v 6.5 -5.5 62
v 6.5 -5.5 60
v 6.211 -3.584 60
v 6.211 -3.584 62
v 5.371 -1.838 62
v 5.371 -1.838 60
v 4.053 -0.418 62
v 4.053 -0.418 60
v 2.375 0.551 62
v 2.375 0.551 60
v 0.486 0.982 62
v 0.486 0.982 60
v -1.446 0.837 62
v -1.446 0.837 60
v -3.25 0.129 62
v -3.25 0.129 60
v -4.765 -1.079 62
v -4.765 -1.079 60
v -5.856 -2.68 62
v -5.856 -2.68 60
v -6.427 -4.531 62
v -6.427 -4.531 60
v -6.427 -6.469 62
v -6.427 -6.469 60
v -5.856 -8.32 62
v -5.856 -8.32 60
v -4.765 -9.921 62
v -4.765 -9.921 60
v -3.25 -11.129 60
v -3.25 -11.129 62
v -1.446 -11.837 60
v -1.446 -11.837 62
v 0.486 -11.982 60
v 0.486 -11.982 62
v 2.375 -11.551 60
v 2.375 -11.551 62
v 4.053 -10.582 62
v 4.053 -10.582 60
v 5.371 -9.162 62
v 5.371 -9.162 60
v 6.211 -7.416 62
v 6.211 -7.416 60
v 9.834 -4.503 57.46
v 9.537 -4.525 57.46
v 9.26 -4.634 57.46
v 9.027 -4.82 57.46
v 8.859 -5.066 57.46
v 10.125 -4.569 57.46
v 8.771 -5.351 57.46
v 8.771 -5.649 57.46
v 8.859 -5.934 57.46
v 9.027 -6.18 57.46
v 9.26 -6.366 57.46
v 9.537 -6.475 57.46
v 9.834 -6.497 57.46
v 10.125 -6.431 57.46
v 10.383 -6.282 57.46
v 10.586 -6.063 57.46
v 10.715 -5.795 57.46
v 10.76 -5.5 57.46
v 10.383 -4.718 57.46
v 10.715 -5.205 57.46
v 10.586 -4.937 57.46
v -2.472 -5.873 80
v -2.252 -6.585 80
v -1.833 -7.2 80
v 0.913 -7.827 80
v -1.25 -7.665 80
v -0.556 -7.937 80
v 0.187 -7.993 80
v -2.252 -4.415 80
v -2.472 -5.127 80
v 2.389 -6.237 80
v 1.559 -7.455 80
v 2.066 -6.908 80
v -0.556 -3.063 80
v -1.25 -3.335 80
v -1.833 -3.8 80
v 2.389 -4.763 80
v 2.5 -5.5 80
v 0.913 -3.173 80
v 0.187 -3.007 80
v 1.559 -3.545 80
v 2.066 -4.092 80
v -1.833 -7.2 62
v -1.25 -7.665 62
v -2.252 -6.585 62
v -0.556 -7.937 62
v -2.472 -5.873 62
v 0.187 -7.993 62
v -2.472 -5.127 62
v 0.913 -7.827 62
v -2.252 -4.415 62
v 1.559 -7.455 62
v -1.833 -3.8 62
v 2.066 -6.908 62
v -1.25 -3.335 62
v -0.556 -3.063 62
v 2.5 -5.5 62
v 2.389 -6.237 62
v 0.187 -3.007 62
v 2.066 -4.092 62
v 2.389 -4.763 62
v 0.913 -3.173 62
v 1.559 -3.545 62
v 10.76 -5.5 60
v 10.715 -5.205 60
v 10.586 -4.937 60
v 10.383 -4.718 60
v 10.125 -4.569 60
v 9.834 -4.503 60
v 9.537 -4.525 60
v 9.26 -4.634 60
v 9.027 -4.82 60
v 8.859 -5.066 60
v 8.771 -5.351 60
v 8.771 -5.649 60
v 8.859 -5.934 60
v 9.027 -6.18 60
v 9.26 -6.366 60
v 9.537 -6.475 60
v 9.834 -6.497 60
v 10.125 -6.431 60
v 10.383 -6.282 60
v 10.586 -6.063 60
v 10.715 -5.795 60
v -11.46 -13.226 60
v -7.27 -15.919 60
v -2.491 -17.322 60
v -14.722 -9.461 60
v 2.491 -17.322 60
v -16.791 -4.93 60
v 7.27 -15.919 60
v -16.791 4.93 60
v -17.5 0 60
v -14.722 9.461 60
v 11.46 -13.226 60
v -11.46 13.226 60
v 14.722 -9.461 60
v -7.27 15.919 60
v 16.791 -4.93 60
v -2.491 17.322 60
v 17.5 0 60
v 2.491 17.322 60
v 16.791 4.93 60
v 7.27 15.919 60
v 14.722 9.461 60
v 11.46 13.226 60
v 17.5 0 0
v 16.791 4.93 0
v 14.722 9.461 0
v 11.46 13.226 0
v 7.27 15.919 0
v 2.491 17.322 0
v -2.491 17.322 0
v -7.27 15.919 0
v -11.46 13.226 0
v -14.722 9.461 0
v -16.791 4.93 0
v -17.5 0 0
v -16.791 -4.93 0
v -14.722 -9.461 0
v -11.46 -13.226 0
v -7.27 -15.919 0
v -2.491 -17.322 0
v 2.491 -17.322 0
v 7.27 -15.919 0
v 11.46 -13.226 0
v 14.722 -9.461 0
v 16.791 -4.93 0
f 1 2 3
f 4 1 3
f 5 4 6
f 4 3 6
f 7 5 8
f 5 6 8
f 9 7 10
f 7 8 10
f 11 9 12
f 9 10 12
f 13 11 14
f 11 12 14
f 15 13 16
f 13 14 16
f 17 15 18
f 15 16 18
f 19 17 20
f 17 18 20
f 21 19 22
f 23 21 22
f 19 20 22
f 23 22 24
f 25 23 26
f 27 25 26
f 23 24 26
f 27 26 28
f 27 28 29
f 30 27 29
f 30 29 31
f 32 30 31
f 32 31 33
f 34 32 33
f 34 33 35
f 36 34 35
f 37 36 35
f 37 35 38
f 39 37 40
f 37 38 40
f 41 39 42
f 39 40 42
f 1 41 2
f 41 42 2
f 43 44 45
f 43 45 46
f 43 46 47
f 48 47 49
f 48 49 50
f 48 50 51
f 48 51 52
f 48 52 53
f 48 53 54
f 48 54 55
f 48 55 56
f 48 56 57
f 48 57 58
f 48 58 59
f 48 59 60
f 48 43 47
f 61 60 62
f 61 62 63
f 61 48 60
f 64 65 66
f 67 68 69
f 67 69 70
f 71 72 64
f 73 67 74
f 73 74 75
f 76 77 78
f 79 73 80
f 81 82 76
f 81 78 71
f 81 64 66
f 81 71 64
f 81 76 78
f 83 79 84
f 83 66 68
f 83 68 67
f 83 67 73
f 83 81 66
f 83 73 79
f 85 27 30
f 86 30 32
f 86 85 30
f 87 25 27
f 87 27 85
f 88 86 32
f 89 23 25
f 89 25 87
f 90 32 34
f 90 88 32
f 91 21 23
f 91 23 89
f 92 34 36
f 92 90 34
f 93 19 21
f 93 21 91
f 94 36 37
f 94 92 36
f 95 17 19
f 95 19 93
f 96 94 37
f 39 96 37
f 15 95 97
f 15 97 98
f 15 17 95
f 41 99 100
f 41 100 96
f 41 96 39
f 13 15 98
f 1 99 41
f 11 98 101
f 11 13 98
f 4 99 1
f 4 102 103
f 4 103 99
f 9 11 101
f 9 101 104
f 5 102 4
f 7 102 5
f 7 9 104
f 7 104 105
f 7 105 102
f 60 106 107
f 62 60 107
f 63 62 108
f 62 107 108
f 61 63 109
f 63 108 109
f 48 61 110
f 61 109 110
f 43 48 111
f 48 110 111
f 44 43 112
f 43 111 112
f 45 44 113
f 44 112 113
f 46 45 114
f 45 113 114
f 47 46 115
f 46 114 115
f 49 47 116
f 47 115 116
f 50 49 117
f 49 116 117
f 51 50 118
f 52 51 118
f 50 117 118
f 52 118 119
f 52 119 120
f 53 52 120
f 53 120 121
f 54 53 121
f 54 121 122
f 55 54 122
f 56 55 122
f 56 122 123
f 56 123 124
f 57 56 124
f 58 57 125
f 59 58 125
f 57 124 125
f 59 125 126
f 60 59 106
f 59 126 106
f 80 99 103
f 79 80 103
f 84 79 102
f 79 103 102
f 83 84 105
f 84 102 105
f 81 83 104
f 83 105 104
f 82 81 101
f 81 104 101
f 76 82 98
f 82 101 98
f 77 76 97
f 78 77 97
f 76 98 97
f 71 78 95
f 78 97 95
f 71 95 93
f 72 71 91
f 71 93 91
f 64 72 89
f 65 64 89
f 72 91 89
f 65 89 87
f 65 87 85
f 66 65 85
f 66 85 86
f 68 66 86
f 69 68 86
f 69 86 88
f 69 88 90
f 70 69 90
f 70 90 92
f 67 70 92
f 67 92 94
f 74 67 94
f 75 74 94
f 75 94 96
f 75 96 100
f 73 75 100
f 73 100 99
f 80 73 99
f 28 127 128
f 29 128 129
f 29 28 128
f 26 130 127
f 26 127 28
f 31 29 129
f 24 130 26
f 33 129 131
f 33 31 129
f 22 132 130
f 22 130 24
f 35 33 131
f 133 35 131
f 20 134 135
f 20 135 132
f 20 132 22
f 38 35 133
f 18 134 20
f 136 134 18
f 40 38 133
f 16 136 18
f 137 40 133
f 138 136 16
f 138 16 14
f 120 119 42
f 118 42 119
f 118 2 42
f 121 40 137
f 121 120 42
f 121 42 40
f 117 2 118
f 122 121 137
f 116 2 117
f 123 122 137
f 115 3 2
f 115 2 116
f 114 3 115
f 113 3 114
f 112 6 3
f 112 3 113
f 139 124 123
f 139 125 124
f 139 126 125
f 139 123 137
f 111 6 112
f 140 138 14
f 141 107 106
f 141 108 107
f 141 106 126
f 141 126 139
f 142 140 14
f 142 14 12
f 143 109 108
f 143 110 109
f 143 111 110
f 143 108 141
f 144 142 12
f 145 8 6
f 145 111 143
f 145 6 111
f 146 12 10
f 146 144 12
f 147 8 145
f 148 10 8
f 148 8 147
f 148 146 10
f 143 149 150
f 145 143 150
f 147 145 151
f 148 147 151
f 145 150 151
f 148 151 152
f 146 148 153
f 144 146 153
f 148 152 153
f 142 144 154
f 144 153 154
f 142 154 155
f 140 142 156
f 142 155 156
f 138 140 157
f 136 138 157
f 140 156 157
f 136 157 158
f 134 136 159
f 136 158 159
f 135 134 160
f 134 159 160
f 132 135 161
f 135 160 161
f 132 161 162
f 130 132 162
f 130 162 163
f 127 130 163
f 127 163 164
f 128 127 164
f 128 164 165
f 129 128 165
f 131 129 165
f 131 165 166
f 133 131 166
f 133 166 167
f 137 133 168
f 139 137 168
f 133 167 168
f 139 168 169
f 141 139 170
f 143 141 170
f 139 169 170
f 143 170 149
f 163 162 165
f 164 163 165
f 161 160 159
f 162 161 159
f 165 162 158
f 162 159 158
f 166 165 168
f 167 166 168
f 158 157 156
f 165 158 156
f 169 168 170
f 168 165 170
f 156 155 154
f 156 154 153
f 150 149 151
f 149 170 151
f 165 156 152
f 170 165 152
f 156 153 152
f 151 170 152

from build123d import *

# Parameters (mm, degrees)
SKETCH1_R           = 17.5
MOTOR_BASE_DEPTH    = 60
SKETCH2_R           = 2.5
SHAFT_DEPTH         = 20
SKETCH3_R           = 6.5
BOSS_EXTRUDE3_DEPTH = 2
SKETCH4_R           = 1
CUT_EXTRUDE1_DEPTH  = 2.54


with BuildPart() as part:
    # Sketch1 → Motor-Base (new body)
    with BuildSketch(Plane.XY):
        Circle(SKETCH1_R)
    extrude(amount=MOTOR_BASE_DEPTH)

    # Sketch2 → Shaft (add)
    with BuildSketch(Plane.XY.offset(60)):
        with Locations((0, -5.5)):
            Circle(SKETCH2_R)
    extrude(amount=SHAFT_DEPTH)

    # Sketch3 → Boss-Extrude3 (add)
    with BuildSketch(Plane.XY.offset(60)):
        with Locations((0, -5.5)):
            Circle(SKETCH3_R)
    extrude(amount=BOSS_EXTRUDE3_DEPTH)

    # Sketch4 → Cut-Extrude1 (cut)
    with BuildSketch(Plane.XY.offset(60)):
        with Locations((9.759593791, -5.5)):
            Circle(SKETCH4_R)
    extrude(amount=-CUT_EXTRUDE1_DEPTH, mode=Mode.SUBTRACT)


solid = part.part
